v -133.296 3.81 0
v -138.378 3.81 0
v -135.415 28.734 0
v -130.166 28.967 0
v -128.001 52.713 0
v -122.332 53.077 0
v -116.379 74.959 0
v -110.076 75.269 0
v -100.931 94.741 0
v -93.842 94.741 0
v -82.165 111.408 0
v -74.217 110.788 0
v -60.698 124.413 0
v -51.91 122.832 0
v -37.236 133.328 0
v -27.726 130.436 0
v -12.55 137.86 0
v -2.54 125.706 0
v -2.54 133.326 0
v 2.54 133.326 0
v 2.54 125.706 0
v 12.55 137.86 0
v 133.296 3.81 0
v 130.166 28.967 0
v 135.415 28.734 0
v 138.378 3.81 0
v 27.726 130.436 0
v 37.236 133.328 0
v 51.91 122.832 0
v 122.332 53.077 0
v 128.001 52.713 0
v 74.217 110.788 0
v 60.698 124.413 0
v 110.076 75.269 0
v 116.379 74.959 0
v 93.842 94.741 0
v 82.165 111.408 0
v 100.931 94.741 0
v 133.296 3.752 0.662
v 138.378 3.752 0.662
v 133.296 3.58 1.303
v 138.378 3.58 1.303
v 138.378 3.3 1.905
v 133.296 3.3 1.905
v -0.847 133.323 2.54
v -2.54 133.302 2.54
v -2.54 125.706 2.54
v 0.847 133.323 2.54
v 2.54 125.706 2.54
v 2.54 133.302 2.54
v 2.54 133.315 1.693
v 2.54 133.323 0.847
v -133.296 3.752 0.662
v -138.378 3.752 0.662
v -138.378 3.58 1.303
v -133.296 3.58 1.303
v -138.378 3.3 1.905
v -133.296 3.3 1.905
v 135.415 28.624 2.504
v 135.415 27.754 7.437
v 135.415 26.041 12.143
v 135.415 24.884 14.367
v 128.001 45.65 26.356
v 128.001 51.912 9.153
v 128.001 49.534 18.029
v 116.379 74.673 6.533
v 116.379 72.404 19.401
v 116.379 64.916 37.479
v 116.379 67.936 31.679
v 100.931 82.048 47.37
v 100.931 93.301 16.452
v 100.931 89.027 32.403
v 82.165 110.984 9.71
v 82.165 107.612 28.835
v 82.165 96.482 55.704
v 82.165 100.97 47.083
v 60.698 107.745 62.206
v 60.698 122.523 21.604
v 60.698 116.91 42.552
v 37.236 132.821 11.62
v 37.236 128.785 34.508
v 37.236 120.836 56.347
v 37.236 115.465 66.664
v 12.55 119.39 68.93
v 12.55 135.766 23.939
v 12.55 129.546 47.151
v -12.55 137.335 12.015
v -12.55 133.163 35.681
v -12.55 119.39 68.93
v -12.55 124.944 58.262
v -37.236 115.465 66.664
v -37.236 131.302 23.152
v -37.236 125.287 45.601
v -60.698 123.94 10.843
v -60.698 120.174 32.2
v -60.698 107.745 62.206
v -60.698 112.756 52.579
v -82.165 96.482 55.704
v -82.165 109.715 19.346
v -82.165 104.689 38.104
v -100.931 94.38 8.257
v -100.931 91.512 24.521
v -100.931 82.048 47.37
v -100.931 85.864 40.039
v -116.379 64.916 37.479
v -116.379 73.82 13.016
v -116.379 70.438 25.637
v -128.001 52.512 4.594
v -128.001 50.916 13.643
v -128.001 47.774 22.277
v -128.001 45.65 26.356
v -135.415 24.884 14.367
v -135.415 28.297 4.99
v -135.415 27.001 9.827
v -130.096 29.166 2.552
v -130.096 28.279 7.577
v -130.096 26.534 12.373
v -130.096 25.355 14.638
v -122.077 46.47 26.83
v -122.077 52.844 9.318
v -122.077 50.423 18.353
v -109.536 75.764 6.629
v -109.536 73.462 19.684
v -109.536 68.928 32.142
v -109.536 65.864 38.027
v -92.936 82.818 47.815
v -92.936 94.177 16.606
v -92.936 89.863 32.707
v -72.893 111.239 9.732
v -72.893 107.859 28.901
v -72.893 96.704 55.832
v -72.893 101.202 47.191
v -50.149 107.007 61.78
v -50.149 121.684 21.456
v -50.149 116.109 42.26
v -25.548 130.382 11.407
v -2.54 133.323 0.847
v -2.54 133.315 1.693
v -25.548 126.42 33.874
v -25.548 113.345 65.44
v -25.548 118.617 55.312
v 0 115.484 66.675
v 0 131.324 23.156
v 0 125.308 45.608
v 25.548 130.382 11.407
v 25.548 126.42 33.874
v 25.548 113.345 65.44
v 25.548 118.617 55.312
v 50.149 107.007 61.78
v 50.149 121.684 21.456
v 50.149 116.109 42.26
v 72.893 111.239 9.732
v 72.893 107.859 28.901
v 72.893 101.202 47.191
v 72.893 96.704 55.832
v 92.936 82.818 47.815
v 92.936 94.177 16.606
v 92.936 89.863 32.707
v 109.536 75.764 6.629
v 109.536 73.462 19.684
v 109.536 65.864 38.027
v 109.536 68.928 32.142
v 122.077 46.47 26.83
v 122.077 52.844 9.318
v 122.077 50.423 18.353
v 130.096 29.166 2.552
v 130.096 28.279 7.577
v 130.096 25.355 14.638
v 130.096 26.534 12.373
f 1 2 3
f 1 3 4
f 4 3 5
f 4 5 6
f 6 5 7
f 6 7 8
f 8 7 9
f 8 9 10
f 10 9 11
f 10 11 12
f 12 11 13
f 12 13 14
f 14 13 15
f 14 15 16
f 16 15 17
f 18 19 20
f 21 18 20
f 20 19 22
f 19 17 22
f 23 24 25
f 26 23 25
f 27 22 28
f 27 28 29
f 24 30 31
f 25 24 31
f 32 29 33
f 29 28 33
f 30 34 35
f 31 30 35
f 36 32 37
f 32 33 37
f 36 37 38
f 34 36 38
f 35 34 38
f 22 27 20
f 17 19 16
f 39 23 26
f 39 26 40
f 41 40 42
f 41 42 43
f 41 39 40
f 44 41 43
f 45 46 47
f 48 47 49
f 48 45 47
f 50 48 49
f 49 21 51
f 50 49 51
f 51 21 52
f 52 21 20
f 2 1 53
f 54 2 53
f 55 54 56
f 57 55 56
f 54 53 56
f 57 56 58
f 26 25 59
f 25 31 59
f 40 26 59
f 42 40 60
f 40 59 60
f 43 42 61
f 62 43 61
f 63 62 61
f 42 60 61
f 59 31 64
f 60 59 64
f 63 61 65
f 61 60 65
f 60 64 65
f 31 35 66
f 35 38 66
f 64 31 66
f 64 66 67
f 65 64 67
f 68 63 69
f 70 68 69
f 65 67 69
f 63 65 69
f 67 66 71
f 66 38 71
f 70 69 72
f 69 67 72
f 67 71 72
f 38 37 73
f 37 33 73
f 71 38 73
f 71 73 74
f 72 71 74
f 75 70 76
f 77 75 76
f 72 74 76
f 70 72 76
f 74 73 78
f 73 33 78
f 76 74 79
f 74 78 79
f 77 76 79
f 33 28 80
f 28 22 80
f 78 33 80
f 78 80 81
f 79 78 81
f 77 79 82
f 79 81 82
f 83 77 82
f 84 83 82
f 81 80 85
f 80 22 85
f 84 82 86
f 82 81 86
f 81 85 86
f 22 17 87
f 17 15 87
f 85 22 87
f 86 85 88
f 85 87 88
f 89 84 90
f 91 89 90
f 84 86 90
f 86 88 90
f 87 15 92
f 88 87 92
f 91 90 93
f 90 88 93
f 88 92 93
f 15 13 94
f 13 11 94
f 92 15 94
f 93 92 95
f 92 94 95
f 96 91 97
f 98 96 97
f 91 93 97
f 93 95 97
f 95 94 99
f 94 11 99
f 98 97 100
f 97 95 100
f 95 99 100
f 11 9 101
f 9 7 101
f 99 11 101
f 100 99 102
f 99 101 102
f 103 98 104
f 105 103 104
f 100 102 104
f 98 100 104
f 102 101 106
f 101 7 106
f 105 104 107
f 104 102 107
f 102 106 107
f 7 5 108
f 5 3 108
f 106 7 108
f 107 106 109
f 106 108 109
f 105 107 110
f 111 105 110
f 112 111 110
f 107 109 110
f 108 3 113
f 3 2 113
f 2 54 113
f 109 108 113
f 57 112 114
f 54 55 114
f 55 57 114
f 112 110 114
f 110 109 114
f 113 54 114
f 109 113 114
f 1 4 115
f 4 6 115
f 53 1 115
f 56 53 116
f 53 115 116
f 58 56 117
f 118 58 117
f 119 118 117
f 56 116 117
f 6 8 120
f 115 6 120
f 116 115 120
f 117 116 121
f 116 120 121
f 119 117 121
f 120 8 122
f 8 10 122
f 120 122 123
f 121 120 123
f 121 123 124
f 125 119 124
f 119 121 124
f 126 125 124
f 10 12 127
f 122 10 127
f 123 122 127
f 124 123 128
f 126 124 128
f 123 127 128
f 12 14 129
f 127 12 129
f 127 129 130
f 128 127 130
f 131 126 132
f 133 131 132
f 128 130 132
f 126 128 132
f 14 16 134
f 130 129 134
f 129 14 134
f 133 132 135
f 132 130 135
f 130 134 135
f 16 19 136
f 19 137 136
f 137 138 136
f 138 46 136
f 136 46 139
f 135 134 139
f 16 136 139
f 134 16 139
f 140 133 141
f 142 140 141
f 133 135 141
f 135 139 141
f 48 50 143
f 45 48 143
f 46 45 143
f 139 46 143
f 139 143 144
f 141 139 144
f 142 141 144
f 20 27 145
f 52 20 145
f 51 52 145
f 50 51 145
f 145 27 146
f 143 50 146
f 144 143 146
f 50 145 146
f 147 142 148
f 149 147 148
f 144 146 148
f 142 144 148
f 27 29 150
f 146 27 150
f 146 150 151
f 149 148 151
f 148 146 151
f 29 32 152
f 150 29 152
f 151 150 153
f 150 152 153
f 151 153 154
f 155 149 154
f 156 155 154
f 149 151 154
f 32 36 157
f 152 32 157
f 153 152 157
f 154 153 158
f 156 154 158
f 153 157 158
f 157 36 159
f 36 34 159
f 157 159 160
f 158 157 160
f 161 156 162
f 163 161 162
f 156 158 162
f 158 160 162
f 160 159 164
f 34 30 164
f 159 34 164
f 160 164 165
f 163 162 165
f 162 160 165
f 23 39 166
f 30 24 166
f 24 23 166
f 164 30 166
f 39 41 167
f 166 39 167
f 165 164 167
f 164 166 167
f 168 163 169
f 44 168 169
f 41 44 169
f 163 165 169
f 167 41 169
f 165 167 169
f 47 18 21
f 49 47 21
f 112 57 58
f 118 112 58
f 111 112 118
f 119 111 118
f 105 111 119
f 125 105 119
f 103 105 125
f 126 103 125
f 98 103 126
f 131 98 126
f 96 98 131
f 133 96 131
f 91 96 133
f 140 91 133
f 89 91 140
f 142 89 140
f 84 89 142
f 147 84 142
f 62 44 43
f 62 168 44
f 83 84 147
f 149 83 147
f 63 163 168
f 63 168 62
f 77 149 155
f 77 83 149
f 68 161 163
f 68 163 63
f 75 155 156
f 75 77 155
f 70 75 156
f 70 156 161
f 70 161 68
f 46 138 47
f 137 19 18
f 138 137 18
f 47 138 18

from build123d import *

# Parameters (mm, degrees)
F1_ANGLE      = 30
F2_R          = 3.81
F3_DEPTH      = 138.431
F3_DEPTH_BACK = 138.431
F5_DEPTH      = 2.54


with BuildPart() as f1:
    # F0 (on Top) → F1 (revolve)
    with BuildSketch(Plane.XY):
        with BuildLine():
            Line((-138.43, 0), (-133.35, 0))
            ThreePointArc((-133.35, 0), (0, 133.35), (133.35, 0))
            Line((133.35, 0), (138.43, 0))
            ThreePointArc((138.43, 0), (0, 138.43), (-138.43, 0))
        make_face()
    revolve(axis=Axis((-66.675, 0, 0), (1, 0, 0)), revolution_arc=F1_ANGLE)

    # F2 (on Right) → F3 (cut, two sides)
    with BuildSketch(Plane.YZ) as f3_sk:
        Circle(F2_R)
    extrude(amount=-F3_DEPTH, mode=Mode.SUBTRACT)
    extrude(f3_sk.sketch, amount=F3_DEPTH_BACK, mode=Mode.SUBTRACT)

    # F4 (on Top) → F5 (join)
    with BuildSketch(Plane.XY):
        with BuildLine():
            ThreePointArc((2.54, 133.3258073293), (0, 133.35), (-2.54, 133.3258073293))
            Line((-2.54, 133.3258073293), (-2.54, 125.7058073293))
            Line((-2.54, 125.7058073293), (2.54, 125.7058073293))
            Line((2.54, 125.7058073293), (2.54, 133.3258073293))
        make_face()
    extrude(amount=F5_DEPTH)


solid = f1.part
